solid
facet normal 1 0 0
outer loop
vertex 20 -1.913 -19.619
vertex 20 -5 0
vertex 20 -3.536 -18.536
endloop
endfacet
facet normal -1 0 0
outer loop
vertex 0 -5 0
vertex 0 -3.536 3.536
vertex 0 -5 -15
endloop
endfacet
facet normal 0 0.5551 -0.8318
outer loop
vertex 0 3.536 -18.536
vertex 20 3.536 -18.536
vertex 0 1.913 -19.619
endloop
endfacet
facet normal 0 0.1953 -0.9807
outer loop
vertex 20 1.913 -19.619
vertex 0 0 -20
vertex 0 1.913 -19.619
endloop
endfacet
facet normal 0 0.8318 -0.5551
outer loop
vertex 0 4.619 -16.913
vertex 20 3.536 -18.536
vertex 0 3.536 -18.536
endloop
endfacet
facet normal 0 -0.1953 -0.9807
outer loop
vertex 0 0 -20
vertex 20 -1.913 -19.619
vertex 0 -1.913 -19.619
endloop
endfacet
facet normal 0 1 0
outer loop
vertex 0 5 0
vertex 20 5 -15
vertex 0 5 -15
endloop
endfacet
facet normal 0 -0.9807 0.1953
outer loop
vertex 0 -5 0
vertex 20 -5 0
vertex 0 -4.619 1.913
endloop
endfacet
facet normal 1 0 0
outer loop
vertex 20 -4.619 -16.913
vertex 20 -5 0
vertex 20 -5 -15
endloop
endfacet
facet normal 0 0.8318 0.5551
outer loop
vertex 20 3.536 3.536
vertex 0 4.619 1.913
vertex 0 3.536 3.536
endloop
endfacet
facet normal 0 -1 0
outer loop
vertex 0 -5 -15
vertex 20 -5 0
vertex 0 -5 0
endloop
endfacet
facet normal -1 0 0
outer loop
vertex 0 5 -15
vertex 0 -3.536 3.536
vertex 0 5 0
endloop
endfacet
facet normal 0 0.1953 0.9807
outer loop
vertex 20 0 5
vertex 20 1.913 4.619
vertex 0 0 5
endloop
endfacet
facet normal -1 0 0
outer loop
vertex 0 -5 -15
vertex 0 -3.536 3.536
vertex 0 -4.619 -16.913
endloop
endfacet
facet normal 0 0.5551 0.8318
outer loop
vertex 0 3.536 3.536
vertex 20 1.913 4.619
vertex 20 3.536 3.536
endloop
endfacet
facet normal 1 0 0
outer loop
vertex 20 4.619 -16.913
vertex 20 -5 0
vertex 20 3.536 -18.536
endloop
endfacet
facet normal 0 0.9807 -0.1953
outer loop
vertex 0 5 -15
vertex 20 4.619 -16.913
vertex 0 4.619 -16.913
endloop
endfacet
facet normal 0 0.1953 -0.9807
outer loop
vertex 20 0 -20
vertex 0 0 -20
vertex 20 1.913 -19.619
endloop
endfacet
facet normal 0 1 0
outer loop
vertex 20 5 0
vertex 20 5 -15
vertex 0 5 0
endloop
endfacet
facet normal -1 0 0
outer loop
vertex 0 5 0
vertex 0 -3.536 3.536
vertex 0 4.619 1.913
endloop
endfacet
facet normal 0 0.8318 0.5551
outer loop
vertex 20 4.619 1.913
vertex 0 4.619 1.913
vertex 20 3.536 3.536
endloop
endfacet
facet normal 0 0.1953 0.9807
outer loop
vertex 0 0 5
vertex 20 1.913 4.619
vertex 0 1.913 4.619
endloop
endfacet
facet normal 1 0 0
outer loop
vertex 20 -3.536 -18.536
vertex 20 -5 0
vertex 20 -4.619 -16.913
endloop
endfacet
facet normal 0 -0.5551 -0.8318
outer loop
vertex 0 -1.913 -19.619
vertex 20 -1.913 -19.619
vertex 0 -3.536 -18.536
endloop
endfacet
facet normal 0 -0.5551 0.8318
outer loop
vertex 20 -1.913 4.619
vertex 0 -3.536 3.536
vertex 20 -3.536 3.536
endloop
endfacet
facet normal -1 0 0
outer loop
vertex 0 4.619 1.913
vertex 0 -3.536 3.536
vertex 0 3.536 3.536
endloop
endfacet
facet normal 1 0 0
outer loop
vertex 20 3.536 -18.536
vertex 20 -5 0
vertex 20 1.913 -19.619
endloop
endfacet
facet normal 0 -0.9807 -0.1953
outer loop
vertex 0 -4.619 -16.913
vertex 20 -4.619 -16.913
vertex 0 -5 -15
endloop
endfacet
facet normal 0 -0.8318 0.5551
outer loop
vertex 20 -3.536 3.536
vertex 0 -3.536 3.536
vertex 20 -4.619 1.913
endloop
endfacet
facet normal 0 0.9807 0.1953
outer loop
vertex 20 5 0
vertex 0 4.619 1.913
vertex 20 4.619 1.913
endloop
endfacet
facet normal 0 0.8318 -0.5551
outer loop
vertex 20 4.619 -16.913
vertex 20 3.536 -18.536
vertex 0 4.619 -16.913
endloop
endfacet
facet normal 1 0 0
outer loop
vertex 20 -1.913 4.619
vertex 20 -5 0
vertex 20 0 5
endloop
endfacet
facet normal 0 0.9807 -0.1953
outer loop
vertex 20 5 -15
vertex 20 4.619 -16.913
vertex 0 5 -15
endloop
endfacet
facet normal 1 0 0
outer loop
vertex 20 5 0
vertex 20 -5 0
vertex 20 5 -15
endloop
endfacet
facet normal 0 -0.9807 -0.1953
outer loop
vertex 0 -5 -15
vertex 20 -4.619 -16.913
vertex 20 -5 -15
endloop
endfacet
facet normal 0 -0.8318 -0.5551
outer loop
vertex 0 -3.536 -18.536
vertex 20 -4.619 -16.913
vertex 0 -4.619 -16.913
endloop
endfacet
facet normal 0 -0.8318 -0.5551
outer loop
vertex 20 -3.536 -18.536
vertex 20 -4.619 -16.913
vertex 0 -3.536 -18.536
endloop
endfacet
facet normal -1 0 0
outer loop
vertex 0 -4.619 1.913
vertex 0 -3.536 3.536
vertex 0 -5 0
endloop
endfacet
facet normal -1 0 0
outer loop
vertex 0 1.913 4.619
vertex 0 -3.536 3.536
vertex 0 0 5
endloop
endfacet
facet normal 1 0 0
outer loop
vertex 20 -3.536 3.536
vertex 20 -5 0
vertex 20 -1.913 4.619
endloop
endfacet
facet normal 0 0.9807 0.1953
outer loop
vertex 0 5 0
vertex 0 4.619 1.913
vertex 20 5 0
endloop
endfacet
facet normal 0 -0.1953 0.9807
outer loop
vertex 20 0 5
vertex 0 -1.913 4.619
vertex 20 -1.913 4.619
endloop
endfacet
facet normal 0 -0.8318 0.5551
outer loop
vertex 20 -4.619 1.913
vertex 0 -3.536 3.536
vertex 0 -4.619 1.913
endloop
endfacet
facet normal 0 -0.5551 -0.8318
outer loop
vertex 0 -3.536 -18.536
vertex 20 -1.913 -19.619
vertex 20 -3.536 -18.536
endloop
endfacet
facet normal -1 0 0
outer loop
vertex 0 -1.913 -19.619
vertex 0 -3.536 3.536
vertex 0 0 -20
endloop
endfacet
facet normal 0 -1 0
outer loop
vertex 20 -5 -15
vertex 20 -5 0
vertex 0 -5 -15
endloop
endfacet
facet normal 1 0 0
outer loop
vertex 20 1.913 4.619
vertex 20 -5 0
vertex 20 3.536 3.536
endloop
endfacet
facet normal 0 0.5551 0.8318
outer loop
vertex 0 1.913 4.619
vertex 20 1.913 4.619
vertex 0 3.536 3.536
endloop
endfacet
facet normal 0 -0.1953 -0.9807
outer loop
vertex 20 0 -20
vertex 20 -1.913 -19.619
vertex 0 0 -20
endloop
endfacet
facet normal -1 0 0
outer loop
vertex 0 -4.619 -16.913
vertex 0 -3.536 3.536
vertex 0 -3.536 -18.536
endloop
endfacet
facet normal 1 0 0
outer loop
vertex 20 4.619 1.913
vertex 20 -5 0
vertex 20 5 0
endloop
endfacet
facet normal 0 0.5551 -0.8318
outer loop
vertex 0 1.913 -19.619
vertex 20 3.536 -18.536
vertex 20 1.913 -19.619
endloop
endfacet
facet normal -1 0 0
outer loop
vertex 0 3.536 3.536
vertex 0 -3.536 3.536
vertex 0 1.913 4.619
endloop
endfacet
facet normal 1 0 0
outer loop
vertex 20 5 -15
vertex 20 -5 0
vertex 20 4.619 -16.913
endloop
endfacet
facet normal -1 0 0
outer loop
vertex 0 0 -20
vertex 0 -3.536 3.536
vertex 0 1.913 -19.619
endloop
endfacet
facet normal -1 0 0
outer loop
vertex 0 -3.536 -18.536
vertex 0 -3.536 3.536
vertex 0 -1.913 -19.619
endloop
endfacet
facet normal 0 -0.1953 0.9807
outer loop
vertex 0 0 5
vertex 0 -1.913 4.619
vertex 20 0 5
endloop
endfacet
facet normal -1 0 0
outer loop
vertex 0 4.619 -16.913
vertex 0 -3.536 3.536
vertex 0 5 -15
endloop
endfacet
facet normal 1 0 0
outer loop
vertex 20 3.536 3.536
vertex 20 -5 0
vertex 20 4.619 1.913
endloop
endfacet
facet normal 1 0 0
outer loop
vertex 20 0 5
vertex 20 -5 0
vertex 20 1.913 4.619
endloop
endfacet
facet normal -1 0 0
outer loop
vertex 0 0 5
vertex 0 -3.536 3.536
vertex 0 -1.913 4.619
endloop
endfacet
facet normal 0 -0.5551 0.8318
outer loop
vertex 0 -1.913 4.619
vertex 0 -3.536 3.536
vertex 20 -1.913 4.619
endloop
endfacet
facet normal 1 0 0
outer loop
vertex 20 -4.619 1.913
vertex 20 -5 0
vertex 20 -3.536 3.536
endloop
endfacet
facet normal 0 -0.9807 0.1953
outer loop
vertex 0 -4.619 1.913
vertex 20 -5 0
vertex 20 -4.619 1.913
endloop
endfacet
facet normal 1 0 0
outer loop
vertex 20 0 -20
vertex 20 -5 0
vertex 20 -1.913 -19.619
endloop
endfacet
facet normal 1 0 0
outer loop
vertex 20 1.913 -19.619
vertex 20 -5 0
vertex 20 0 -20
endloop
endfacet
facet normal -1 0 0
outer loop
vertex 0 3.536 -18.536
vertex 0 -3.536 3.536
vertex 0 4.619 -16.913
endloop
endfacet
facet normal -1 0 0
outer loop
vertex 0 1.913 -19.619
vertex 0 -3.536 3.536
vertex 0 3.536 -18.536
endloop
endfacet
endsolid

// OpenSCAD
rotate([0,90,0]) {
    hull() {
        translate([15,0,0]) 
            cylinder(h=20,d=10,center=false);
        cylinder(h=20,d=10,center=false);
    }
}
